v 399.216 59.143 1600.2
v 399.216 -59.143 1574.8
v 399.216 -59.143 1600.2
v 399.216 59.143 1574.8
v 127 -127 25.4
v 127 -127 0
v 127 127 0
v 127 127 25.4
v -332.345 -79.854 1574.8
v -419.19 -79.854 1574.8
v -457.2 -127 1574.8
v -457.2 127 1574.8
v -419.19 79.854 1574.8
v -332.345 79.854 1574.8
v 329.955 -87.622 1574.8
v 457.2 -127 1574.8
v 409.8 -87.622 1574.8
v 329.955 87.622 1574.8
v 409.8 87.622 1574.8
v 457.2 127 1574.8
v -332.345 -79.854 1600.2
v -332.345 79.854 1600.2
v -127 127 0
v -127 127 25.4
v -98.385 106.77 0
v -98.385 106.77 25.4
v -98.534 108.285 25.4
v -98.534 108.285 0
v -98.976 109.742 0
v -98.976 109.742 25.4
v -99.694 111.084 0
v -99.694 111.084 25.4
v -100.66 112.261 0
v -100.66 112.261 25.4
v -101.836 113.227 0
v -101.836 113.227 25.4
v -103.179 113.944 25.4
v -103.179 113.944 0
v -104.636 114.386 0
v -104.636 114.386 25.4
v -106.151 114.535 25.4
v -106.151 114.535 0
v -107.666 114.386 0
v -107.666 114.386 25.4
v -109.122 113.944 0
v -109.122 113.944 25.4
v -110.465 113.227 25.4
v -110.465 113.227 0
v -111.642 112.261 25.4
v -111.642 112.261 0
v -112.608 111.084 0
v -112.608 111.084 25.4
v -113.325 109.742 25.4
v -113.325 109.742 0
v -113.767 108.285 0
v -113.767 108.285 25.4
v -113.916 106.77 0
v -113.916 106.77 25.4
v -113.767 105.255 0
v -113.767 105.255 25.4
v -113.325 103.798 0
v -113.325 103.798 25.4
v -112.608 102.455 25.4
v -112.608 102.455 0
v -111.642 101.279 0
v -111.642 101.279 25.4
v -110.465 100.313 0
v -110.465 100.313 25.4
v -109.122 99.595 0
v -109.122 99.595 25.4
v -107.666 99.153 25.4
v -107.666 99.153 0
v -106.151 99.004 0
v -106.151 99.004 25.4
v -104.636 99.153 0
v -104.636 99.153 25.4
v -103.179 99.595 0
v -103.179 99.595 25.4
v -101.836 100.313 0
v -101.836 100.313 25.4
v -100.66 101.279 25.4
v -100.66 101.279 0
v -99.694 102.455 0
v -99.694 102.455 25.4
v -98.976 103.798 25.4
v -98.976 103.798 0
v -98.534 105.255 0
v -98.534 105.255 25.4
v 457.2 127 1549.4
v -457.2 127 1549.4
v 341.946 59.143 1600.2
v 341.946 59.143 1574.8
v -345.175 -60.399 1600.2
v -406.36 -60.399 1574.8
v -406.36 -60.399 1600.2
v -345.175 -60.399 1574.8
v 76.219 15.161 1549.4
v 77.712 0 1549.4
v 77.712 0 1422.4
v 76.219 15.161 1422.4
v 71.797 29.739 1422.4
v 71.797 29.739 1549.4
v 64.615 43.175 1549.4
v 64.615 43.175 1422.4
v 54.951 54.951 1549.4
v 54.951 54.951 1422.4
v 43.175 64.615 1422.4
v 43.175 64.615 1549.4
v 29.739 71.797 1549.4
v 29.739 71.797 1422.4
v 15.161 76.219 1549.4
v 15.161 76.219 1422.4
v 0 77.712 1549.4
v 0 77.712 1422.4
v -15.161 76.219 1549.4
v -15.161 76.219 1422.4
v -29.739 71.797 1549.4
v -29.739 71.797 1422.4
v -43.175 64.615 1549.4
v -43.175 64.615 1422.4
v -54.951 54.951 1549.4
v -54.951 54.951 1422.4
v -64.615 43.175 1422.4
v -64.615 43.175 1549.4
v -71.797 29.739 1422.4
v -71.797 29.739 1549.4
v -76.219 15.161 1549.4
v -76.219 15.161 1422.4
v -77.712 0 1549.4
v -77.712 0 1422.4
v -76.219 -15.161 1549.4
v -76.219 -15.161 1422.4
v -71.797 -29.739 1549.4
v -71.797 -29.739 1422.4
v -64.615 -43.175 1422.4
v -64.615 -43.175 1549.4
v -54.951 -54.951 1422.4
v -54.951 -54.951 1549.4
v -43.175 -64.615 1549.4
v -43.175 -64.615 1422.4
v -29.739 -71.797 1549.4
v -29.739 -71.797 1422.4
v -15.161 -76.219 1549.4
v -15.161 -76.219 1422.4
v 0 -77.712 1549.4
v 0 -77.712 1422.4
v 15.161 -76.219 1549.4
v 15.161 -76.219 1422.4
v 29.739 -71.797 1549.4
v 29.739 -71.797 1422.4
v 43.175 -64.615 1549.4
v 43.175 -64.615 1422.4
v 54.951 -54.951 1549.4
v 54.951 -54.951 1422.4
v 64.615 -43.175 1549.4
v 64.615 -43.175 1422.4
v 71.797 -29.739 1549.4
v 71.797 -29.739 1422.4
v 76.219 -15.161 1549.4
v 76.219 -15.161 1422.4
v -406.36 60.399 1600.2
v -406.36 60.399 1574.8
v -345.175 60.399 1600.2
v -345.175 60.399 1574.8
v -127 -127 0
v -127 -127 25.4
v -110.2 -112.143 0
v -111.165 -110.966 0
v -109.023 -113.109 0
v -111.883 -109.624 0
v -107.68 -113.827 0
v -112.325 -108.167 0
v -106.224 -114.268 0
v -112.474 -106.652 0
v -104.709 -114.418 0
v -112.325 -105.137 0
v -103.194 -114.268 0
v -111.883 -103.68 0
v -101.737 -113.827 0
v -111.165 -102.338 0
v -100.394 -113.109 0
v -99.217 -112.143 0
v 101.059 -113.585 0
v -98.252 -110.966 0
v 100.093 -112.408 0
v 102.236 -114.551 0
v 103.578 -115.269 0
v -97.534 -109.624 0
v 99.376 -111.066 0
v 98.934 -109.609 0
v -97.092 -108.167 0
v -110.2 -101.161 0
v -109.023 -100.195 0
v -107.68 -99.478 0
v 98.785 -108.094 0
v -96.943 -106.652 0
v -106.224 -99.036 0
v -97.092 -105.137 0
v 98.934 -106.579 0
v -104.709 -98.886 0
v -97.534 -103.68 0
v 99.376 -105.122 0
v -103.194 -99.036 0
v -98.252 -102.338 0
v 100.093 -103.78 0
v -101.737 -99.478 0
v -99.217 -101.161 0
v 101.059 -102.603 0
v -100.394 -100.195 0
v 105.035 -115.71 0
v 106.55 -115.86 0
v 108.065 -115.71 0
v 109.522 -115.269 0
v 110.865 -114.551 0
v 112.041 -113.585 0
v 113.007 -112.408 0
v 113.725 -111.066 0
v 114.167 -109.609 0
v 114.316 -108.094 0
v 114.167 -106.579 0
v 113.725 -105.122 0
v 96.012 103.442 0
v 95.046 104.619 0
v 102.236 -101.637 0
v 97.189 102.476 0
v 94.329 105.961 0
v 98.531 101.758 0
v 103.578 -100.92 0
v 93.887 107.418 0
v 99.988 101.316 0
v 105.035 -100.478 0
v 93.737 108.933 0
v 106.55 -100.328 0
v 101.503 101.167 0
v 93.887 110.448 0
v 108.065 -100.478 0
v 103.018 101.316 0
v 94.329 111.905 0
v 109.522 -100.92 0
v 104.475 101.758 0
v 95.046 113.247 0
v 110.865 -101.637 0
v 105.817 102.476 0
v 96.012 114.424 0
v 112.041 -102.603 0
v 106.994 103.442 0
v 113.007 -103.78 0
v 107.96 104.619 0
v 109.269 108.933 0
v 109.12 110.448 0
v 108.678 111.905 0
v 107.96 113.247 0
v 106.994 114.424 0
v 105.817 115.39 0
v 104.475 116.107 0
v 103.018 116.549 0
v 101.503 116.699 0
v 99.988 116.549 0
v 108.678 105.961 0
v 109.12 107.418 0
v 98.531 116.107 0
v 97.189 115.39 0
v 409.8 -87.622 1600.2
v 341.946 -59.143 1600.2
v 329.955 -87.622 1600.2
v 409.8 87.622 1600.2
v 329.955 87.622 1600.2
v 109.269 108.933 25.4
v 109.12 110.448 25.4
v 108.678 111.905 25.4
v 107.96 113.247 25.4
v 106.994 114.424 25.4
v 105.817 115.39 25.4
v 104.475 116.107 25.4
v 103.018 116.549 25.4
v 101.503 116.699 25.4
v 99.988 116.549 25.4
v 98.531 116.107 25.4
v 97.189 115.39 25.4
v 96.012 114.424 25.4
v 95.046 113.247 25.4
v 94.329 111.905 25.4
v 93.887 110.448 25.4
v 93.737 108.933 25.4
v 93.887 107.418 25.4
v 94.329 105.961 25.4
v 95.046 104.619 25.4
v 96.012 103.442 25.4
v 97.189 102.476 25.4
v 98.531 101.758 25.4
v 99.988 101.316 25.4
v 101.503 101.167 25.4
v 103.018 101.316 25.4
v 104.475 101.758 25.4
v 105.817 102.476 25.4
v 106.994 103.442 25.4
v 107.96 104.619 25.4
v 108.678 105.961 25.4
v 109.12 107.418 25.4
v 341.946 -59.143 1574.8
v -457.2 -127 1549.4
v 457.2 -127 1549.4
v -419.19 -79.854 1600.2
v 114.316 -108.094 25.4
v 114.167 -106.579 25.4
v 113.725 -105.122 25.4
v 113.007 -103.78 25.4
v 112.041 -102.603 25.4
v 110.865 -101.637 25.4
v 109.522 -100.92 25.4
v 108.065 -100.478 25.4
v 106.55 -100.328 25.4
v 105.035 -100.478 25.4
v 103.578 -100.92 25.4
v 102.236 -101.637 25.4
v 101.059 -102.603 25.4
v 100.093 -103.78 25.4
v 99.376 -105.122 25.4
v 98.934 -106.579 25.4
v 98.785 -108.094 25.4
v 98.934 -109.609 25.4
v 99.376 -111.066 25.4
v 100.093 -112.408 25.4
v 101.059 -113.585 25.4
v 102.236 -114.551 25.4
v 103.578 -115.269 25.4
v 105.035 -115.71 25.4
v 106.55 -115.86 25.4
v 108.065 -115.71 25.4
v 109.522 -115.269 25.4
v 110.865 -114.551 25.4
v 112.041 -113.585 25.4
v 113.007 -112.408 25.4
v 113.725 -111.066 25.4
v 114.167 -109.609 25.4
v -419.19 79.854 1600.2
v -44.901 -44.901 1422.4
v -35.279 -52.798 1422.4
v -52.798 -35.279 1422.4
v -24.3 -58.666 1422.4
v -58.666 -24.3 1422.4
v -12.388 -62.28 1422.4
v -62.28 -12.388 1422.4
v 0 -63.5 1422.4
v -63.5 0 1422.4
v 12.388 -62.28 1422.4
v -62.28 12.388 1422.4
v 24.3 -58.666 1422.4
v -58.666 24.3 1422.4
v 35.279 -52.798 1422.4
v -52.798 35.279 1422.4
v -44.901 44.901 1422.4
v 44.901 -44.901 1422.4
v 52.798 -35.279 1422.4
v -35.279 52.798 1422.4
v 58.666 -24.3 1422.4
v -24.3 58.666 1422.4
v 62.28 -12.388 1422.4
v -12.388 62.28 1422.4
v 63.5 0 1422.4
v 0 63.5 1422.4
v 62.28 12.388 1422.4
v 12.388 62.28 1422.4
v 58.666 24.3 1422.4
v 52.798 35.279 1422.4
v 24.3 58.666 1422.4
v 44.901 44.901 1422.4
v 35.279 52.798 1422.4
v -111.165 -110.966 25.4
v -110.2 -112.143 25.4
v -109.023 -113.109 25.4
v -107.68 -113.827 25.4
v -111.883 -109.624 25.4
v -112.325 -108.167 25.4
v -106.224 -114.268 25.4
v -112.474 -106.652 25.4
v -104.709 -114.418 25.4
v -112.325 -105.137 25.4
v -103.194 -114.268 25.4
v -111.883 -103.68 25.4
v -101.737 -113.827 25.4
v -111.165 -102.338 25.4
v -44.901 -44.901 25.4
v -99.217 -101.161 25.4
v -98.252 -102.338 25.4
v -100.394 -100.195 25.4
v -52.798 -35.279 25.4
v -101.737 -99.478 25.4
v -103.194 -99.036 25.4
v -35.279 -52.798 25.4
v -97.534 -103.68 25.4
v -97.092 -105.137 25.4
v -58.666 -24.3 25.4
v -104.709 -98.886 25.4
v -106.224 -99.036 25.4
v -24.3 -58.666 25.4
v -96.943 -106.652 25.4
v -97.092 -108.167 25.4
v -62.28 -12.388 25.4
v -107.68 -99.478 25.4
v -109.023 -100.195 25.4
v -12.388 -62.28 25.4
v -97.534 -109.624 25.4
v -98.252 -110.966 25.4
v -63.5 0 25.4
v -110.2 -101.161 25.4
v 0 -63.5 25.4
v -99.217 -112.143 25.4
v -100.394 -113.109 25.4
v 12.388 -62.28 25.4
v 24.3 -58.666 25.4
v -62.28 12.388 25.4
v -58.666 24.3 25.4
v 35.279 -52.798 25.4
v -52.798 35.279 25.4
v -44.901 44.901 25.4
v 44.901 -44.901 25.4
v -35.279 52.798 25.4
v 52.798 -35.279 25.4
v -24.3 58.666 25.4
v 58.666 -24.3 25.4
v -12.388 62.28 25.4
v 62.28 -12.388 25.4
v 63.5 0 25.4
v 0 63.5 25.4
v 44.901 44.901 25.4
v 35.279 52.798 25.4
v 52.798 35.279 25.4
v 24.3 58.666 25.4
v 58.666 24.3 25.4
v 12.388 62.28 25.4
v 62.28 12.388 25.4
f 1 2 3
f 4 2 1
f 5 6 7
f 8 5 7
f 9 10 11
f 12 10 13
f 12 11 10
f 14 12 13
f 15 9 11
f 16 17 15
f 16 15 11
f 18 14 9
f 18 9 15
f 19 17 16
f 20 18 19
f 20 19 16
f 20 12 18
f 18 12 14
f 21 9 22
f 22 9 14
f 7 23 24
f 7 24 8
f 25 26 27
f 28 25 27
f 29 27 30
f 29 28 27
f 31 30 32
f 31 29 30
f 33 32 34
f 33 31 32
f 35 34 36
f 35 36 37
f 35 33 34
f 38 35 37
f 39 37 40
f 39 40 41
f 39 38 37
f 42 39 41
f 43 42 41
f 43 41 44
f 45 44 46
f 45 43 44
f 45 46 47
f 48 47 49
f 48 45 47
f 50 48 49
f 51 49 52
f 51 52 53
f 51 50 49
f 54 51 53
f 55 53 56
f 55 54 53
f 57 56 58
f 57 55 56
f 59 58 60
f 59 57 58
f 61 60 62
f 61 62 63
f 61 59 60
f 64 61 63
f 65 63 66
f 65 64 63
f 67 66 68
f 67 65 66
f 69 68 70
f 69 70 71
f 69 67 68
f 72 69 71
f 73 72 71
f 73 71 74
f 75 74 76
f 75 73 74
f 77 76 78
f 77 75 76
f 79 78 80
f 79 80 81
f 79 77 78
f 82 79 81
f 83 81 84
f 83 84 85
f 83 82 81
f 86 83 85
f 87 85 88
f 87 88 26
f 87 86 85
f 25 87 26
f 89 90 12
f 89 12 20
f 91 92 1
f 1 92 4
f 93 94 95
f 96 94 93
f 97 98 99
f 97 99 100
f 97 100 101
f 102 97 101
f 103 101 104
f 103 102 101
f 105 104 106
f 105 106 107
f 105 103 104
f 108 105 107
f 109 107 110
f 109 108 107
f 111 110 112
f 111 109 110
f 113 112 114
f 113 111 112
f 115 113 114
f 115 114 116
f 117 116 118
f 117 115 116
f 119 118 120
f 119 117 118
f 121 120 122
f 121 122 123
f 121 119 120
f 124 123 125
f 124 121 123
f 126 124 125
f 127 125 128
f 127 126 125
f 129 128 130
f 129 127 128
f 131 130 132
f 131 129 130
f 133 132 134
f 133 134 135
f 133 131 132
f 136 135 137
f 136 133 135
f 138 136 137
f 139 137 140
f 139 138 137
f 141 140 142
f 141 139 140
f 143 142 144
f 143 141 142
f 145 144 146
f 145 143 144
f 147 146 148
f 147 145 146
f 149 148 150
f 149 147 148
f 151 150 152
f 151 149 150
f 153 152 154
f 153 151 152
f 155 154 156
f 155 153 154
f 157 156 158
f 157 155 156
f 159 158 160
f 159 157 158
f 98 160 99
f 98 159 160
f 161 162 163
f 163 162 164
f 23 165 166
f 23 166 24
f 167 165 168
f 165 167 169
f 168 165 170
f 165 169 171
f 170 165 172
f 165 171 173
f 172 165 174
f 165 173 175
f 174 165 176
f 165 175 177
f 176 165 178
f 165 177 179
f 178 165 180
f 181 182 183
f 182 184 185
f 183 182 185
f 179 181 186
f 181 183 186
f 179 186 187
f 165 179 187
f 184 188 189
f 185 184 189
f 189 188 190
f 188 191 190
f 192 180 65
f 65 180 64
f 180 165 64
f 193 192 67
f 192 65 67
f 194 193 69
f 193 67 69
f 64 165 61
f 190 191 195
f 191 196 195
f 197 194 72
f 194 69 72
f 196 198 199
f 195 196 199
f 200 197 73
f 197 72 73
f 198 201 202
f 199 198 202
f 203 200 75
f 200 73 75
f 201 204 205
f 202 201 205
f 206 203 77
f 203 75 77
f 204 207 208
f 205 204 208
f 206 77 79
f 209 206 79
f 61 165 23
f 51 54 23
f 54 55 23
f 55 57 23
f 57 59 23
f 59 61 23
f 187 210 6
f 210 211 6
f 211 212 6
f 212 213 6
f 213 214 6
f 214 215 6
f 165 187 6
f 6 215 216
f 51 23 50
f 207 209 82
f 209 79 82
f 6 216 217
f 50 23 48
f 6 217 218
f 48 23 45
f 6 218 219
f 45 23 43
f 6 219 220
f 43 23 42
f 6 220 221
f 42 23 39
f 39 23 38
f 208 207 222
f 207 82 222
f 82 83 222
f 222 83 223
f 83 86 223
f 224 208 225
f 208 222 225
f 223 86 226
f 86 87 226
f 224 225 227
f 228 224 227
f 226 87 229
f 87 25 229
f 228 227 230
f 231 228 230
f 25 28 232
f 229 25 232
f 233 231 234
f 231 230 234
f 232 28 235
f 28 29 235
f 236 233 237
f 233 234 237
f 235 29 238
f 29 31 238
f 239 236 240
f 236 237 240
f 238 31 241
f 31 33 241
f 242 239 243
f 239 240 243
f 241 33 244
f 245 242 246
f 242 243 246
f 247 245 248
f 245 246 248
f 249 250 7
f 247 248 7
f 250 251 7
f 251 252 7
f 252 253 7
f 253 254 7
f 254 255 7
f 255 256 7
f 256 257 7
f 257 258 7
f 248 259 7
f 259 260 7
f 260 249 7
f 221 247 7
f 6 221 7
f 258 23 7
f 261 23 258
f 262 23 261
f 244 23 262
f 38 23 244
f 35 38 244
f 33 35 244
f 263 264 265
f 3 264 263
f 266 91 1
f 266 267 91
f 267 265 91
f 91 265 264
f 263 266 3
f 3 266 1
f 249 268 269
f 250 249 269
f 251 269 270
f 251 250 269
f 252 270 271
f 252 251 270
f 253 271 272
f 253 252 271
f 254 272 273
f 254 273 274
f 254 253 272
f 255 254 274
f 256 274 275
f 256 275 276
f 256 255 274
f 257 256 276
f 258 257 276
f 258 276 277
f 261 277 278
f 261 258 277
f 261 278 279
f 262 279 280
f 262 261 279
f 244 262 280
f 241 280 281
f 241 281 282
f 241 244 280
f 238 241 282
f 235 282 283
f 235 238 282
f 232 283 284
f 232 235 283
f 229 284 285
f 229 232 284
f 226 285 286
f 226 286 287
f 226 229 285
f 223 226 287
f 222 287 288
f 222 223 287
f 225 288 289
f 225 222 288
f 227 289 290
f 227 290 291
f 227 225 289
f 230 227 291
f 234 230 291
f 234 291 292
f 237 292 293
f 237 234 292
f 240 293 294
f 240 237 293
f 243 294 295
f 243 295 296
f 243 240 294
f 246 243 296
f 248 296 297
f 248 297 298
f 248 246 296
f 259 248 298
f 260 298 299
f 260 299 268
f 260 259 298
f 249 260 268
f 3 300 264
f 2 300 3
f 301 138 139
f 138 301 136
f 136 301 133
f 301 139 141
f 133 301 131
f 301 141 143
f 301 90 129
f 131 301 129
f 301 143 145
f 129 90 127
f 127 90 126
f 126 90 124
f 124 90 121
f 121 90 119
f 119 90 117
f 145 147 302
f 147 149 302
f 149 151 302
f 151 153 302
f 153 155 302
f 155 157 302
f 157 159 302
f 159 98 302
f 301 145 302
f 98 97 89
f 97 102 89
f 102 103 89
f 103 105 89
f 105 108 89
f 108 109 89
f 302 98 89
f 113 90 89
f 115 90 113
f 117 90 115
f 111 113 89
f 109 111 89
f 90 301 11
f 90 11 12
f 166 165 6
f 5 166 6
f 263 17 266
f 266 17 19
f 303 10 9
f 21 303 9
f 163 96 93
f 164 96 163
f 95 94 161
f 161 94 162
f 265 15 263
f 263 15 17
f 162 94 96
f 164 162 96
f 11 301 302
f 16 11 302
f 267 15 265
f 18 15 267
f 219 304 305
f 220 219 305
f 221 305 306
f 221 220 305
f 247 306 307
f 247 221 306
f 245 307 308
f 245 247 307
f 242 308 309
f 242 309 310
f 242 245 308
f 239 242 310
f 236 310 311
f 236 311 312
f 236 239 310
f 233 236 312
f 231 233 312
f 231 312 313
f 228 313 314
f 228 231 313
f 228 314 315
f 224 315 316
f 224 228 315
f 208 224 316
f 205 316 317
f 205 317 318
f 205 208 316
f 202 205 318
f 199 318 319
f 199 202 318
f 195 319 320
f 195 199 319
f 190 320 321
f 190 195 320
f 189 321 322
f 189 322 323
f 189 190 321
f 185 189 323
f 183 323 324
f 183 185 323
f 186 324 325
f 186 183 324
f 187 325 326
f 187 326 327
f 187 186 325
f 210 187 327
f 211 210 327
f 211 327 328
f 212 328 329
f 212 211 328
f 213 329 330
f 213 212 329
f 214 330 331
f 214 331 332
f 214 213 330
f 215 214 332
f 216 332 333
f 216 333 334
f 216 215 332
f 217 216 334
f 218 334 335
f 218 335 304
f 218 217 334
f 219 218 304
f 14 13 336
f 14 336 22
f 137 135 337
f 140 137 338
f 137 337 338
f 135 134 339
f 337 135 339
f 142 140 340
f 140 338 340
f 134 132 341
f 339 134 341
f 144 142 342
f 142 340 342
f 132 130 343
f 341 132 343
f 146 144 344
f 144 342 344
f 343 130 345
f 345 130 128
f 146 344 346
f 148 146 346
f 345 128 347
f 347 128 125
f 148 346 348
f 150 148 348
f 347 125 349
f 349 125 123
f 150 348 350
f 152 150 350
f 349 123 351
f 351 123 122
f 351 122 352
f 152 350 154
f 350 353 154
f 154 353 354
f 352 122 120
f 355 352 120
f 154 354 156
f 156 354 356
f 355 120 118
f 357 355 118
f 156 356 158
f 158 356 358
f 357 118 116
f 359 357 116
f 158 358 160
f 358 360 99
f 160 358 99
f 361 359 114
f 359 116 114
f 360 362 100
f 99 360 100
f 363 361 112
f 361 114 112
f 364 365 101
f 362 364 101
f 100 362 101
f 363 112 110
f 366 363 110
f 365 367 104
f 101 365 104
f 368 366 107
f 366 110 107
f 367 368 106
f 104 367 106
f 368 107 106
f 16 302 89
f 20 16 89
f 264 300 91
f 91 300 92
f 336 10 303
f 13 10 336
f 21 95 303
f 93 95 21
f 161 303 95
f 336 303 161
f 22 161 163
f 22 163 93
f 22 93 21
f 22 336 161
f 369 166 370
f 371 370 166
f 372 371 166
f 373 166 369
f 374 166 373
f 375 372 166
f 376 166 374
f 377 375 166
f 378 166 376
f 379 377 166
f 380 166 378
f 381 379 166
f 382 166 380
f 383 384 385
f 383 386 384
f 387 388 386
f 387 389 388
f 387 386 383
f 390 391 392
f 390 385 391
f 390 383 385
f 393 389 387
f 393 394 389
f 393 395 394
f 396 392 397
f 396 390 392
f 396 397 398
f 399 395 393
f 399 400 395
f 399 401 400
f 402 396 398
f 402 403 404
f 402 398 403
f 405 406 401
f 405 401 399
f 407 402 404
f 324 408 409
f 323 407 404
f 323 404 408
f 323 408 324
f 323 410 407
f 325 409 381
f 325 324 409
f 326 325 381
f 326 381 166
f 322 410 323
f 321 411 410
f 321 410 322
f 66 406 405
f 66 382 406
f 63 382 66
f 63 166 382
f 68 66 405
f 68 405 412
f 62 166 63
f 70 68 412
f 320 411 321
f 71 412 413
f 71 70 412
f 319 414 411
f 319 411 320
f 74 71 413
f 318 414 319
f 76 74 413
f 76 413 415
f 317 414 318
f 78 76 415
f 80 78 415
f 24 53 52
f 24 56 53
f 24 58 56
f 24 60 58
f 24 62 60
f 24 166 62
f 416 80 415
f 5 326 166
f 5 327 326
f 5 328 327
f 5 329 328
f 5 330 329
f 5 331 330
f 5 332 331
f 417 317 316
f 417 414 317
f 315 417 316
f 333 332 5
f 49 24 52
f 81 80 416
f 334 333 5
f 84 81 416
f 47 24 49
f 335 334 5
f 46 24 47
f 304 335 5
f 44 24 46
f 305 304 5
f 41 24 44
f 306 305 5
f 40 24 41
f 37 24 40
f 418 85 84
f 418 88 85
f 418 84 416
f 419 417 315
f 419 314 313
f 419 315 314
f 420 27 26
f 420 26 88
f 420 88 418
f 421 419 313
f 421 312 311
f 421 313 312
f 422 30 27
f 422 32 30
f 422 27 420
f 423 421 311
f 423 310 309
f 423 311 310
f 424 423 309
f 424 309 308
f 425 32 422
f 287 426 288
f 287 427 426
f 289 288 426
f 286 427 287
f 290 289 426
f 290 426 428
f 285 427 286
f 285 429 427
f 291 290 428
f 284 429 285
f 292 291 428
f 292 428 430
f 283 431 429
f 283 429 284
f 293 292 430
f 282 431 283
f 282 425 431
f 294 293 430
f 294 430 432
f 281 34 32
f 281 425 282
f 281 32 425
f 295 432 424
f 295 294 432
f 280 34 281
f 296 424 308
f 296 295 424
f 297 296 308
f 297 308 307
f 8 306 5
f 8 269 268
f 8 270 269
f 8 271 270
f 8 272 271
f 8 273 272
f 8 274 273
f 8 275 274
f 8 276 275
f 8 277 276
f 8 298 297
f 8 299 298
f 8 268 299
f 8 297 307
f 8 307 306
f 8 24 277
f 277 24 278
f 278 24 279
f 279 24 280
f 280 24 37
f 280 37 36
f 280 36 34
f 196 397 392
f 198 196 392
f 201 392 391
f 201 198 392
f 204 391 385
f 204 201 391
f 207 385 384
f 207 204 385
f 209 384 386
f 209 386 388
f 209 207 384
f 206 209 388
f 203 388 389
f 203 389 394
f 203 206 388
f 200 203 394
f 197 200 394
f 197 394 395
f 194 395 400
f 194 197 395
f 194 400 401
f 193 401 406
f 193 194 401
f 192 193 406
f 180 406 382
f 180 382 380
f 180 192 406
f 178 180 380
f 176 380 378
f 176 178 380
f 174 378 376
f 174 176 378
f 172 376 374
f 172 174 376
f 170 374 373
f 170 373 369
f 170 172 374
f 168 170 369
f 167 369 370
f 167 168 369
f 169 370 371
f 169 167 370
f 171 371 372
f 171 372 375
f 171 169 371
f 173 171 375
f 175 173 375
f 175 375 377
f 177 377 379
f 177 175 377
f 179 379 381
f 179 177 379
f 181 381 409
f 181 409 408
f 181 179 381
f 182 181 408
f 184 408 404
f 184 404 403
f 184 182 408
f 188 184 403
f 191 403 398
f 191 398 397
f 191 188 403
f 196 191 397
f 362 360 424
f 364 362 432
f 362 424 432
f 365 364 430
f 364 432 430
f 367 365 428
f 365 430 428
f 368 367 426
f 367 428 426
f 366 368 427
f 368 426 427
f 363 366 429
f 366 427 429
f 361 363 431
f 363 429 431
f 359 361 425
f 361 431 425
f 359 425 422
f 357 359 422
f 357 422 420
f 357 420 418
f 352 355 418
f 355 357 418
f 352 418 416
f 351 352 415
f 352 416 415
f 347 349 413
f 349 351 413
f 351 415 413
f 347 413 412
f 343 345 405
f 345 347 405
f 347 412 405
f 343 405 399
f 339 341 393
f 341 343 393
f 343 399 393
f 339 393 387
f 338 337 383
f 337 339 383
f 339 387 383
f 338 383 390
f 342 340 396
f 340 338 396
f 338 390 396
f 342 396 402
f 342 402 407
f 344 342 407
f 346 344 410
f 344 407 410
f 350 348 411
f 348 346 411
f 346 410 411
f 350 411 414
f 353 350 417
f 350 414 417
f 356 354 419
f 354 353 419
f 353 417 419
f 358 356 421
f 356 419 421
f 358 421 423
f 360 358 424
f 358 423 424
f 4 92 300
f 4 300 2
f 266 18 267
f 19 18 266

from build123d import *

# Parameters (mm, degrees)
F0_W      = 254
F0_H      = 254
F0_R      = 7.765626
F0_R_2    = 62.44742
F1_DEPTH  = 25.4
F2_R      = 63.5
F3_DEPTH  = 1524
F4_R      = 63.5
F5_DEPTH  = 25.4
F4_W      = 914.4
F4_H      = 254
F6_DEPTH  = 25.4
F8_W      = 79.844535
F8_H      = 175.243094
F8_W_2    = 57.27005
F8_H_2    = 118.286156
F9_W      = 79.844535
F9_H      = 175.243094
F9_W_2    = 57.27005
F9_H_2    = 118.286156
F9_W_3    = 45.544207
F9_H_3    = 10.561109
F10_DEPTH = 25.4
F11_W     = 86.844683
F11_H     = 159.707428
F11_W_2   = 61.185301
F11_H_2   = 120.797262
F12_DEPTH = 25.4
F13_R     = 77.71217
F14_DEPTH = 127


with BuildPart() as f1:
    # F0 (on Top) → F1 (new body)
    with BuildSketch(Plane.XY):
        Rectangle(F0_W, F0_H)
        with Locations((-104.70859, -106.652051)):
            Circle(F0_R, mode=Mode.SUBTRACT)
        with Locations((106.550232, -108.094081)):
            Circle(F0_R, mode=Mode.SUBTRACT)
        with Locations((-106.150627, 106.76983)):
            Circle(F0_R, mode=Mode.SUBTRACT)
        Circle(F0_R_2, mode=Mode.SUBTRACT)
        with Locations((101.503089, 108.93289)):
            Circle(F0_R, mode=Mode.SUBTRACT)
        Circle(F0_R_2)
    extrude(amount=F1_DEPTH)

    # F2 (on face) → F3 (join)
    with BuildSketch(Plane.XY.offset(25.4)):
        Circle(F2_R)
    extrude(amount=F3_DEPTH)

    # F4 (on face) → F5 (join)
    with BuildSketch(Plane.XY.offset(1549.4)):
        Circle(F4_R)
    extrude(amount=F5_DEPTH)

    # F4 (on face) → F6 (join)
    with BuildSketch(Plane.XY.offset(1549.4)):
        Rectangle(F4_W, F4_H)
        Circle(F4_R, mode=Mode.SUBTRACT)
    extrude(amount=F6_DEPTH)

    # F8 (on face) + F9 (on face) → F10 (join)
    with BuildSketch(Plane.XY.offset(1574.8)):
        with Locations((369.877309, 0)):
            Rectangle(F8_W, F8_H)
        with Locations((370.58115, 0)):
            Rectangle(F8_W_2, F8_H_2, mode=Mode.SUBTRACT)
    with BuildSketch(Plane.XY.offset(1574.8)):
        with Locations((369.877309, 0)):
            Rectangle(F9_W, F9_H)
        with Locations((370.58115, 0)):
            Rectangle(F9_W_2, F9_H_2, mode=Mode.SUBTRACT)
        with Locations((371.858775, 73.884032)):
            Rectangle(F9_W_3, F9_H_3, mode=Mode.SUBTRACT)
    extrude(amount=F10_DEPTH)

    # F11 (on face) → F12 (join)
    with BuildSketch(Plane.XY.offset(1574.8)):
        with Locations((-375.767172, 0)):
            Rectangle(F11_W, F11_H)
        with Locations((-375.767172, 0)):
            Rectangle(F11_W_2, F11_H_2, mode=Mode.SUBTRACT)
    extrude(amount=F12_DEPTH)

    # F13 (on face) → F14 (join)
    with BuildSketch(Plane.XY.offset(1549.4)):
        Circle(F13_R)
    extrude(amount=-F14_DEPTH)


solid = f1.part
